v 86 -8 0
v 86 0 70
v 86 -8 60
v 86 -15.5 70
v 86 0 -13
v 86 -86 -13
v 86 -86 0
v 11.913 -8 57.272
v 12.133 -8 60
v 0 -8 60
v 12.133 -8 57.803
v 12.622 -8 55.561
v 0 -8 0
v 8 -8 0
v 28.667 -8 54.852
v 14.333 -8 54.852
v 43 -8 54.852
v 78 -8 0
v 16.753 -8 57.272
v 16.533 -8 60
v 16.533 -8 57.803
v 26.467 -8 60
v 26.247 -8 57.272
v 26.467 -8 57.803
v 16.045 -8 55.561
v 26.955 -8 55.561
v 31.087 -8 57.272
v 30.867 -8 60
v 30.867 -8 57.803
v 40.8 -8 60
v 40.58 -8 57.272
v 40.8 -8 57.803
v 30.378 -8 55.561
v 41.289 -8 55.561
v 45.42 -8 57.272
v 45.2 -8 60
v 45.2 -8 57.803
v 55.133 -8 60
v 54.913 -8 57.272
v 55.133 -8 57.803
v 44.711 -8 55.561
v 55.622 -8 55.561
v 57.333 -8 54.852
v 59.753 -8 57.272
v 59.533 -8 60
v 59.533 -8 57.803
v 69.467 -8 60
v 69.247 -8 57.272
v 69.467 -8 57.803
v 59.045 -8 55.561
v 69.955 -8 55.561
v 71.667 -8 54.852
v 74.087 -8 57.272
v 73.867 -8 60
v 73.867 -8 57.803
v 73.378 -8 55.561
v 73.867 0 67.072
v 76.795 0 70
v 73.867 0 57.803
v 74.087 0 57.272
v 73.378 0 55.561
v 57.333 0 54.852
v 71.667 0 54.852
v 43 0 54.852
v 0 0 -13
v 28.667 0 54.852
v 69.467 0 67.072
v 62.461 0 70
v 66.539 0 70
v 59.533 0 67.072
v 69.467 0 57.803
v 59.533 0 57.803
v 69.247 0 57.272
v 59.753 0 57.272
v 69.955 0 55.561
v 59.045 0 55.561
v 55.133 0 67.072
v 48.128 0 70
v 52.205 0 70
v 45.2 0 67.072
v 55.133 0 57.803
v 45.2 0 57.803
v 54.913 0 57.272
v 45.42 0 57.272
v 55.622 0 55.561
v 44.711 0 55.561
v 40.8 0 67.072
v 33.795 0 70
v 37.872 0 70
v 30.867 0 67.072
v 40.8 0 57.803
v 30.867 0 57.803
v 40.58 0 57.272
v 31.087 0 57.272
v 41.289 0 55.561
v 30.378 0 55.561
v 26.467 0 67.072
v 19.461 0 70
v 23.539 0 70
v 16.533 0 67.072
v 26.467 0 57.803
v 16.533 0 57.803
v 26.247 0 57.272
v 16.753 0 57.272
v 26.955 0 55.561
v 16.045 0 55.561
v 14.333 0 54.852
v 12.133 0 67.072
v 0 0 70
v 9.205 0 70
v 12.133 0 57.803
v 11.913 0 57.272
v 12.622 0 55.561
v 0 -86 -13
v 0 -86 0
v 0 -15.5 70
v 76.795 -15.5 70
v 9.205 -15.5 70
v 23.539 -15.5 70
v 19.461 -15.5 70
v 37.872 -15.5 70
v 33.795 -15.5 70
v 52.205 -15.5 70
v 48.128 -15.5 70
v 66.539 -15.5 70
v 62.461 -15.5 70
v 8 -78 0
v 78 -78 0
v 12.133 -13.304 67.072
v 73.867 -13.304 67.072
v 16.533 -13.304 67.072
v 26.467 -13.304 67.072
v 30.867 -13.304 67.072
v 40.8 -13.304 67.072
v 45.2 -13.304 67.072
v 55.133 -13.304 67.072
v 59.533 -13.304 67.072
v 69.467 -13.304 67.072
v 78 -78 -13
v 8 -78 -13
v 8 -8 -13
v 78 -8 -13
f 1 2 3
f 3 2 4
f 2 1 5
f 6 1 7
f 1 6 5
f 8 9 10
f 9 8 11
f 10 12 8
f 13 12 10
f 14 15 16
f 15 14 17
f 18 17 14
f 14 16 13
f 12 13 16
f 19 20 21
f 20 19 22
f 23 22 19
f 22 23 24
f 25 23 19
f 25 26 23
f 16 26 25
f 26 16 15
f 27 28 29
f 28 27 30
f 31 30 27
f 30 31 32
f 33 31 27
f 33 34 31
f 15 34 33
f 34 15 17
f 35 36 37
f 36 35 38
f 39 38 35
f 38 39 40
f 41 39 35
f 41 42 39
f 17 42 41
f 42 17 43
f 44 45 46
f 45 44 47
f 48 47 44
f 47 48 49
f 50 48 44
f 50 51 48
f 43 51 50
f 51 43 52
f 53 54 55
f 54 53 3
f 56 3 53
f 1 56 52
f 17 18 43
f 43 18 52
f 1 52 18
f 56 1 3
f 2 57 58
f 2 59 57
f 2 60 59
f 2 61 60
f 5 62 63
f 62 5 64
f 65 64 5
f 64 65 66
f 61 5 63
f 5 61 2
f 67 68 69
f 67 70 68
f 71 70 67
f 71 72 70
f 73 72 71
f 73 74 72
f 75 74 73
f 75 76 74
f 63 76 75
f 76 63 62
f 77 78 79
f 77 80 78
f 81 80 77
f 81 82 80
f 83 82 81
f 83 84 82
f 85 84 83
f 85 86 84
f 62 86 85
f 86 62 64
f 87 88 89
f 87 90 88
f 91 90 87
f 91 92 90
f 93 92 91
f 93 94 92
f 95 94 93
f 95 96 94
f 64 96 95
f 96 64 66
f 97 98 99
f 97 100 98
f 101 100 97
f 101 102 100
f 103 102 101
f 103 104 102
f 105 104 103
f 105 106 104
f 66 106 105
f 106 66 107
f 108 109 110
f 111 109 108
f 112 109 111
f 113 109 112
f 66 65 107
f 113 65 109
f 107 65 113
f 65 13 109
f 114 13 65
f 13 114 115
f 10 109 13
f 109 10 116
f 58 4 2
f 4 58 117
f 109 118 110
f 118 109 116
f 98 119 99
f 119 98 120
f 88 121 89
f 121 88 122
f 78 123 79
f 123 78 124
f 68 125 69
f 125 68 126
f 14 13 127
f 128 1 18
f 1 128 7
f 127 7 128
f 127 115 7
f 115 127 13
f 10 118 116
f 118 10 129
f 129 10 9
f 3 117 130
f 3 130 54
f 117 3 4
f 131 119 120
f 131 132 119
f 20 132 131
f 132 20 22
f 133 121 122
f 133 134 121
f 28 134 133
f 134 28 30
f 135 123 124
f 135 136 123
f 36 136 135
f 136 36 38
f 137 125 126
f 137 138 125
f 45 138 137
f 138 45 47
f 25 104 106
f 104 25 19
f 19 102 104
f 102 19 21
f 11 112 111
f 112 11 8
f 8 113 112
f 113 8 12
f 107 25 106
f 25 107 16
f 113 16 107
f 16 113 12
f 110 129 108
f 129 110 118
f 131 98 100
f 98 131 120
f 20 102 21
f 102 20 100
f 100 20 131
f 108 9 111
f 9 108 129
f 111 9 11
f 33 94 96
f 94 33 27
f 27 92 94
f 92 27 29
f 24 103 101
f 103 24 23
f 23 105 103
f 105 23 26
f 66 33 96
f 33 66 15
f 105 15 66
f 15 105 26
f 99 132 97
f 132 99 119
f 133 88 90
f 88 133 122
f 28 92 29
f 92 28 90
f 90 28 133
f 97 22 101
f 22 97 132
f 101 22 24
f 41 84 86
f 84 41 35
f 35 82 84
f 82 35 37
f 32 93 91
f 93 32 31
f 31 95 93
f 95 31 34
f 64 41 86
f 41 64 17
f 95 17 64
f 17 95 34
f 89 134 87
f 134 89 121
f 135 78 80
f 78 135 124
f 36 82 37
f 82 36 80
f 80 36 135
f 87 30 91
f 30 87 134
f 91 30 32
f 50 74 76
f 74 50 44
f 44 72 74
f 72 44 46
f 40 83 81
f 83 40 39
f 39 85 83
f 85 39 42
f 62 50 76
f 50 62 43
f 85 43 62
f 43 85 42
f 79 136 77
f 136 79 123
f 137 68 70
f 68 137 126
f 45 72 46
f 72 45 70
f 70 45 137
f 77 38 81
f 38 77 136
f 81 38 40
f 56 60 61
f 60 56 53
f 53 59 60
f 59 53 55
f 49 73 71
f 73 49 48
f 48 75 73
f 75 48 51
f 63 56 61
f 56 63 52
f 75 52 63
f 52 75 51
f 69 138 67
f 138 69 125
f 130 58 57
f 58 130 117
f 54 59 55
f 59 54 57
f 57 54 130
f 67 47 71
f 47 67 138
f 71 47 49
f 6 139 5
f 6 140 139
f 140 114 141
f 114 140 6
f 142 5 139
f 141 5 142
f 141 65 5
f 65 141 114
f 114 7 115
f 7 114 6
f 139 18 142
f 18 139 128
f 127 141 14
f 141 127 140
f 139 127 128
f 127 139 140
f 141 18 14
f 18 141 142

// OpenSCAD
// electrical outlet width
plug_side = 70;
// electrical outlet height
plug_h = 70;

// thickness of wall outside the outlet
plug_gap = 8;

// depth of wall outside the outlet
plug_depth = 13;
e =0.1;

tray_w = plug_side + plug_gap*2;

module receptible()
{
    rotate([90, 0, 0]) difference() {
        cube([tray_w, plug_h + plug_gap*2, plug_depth]);
        translate([plug_gap, plug_gap, -e])
            cube([plug_side, plug_h, plug_depth + 2*e]);
    }
}

// length of tray
tray_len = 70;
tray_side_bend_h = 7.5;
tray_side_bend_w = 10;

module triangle(len1, len2, h)
{
	linear_extrude(height = h)
	{
		polygon(points=[[0,0], [len1, 0], [0, len2]]);
	}
}

// tray
module tray() 
{
    cube([tray_w, tray_len, plug_gap]);

    translate([0, tray_len, plug_gap])
        rotate ([180, 0, 0]) rotate([0, 90, 0])
            triangle(tray_side_bend_h, tray_side_bend_w, tray_w);
}

slit_depth = 18;

// cable radius
cable_r = 2.2;
slit_open_l = 7.5*2;

module slit(pos)
{
    translate([pos-cable_r, tray_len-slit_depth/sqrt(2), 0])
        translate([0, 0, -e])
        {
            cube([
                cable_r*2,
                slit_depth,
                plug_gap + tray_side_bend_h + 2*e]);
            translate([cable_r, 0, 0])
            {
                cylinder(r = cable_r*1.1, h = slit_depth);
                translate([0, slit_open_l/2+e, 0])
                    rotate([0, 0, 45])
                        cube([slit_open_l/2,slit_open_l/2, slit_depth]);
            }
        }    
}


// number of cables
slit_count = 4;

rotate([90, 0, 0])
{
    difference()
    {
        tray();
        for (i = [0 : slit_count])
        {
            slit((tray_w/(slit_count+2))*(i+1));
        }
    }

    receptible();
}
